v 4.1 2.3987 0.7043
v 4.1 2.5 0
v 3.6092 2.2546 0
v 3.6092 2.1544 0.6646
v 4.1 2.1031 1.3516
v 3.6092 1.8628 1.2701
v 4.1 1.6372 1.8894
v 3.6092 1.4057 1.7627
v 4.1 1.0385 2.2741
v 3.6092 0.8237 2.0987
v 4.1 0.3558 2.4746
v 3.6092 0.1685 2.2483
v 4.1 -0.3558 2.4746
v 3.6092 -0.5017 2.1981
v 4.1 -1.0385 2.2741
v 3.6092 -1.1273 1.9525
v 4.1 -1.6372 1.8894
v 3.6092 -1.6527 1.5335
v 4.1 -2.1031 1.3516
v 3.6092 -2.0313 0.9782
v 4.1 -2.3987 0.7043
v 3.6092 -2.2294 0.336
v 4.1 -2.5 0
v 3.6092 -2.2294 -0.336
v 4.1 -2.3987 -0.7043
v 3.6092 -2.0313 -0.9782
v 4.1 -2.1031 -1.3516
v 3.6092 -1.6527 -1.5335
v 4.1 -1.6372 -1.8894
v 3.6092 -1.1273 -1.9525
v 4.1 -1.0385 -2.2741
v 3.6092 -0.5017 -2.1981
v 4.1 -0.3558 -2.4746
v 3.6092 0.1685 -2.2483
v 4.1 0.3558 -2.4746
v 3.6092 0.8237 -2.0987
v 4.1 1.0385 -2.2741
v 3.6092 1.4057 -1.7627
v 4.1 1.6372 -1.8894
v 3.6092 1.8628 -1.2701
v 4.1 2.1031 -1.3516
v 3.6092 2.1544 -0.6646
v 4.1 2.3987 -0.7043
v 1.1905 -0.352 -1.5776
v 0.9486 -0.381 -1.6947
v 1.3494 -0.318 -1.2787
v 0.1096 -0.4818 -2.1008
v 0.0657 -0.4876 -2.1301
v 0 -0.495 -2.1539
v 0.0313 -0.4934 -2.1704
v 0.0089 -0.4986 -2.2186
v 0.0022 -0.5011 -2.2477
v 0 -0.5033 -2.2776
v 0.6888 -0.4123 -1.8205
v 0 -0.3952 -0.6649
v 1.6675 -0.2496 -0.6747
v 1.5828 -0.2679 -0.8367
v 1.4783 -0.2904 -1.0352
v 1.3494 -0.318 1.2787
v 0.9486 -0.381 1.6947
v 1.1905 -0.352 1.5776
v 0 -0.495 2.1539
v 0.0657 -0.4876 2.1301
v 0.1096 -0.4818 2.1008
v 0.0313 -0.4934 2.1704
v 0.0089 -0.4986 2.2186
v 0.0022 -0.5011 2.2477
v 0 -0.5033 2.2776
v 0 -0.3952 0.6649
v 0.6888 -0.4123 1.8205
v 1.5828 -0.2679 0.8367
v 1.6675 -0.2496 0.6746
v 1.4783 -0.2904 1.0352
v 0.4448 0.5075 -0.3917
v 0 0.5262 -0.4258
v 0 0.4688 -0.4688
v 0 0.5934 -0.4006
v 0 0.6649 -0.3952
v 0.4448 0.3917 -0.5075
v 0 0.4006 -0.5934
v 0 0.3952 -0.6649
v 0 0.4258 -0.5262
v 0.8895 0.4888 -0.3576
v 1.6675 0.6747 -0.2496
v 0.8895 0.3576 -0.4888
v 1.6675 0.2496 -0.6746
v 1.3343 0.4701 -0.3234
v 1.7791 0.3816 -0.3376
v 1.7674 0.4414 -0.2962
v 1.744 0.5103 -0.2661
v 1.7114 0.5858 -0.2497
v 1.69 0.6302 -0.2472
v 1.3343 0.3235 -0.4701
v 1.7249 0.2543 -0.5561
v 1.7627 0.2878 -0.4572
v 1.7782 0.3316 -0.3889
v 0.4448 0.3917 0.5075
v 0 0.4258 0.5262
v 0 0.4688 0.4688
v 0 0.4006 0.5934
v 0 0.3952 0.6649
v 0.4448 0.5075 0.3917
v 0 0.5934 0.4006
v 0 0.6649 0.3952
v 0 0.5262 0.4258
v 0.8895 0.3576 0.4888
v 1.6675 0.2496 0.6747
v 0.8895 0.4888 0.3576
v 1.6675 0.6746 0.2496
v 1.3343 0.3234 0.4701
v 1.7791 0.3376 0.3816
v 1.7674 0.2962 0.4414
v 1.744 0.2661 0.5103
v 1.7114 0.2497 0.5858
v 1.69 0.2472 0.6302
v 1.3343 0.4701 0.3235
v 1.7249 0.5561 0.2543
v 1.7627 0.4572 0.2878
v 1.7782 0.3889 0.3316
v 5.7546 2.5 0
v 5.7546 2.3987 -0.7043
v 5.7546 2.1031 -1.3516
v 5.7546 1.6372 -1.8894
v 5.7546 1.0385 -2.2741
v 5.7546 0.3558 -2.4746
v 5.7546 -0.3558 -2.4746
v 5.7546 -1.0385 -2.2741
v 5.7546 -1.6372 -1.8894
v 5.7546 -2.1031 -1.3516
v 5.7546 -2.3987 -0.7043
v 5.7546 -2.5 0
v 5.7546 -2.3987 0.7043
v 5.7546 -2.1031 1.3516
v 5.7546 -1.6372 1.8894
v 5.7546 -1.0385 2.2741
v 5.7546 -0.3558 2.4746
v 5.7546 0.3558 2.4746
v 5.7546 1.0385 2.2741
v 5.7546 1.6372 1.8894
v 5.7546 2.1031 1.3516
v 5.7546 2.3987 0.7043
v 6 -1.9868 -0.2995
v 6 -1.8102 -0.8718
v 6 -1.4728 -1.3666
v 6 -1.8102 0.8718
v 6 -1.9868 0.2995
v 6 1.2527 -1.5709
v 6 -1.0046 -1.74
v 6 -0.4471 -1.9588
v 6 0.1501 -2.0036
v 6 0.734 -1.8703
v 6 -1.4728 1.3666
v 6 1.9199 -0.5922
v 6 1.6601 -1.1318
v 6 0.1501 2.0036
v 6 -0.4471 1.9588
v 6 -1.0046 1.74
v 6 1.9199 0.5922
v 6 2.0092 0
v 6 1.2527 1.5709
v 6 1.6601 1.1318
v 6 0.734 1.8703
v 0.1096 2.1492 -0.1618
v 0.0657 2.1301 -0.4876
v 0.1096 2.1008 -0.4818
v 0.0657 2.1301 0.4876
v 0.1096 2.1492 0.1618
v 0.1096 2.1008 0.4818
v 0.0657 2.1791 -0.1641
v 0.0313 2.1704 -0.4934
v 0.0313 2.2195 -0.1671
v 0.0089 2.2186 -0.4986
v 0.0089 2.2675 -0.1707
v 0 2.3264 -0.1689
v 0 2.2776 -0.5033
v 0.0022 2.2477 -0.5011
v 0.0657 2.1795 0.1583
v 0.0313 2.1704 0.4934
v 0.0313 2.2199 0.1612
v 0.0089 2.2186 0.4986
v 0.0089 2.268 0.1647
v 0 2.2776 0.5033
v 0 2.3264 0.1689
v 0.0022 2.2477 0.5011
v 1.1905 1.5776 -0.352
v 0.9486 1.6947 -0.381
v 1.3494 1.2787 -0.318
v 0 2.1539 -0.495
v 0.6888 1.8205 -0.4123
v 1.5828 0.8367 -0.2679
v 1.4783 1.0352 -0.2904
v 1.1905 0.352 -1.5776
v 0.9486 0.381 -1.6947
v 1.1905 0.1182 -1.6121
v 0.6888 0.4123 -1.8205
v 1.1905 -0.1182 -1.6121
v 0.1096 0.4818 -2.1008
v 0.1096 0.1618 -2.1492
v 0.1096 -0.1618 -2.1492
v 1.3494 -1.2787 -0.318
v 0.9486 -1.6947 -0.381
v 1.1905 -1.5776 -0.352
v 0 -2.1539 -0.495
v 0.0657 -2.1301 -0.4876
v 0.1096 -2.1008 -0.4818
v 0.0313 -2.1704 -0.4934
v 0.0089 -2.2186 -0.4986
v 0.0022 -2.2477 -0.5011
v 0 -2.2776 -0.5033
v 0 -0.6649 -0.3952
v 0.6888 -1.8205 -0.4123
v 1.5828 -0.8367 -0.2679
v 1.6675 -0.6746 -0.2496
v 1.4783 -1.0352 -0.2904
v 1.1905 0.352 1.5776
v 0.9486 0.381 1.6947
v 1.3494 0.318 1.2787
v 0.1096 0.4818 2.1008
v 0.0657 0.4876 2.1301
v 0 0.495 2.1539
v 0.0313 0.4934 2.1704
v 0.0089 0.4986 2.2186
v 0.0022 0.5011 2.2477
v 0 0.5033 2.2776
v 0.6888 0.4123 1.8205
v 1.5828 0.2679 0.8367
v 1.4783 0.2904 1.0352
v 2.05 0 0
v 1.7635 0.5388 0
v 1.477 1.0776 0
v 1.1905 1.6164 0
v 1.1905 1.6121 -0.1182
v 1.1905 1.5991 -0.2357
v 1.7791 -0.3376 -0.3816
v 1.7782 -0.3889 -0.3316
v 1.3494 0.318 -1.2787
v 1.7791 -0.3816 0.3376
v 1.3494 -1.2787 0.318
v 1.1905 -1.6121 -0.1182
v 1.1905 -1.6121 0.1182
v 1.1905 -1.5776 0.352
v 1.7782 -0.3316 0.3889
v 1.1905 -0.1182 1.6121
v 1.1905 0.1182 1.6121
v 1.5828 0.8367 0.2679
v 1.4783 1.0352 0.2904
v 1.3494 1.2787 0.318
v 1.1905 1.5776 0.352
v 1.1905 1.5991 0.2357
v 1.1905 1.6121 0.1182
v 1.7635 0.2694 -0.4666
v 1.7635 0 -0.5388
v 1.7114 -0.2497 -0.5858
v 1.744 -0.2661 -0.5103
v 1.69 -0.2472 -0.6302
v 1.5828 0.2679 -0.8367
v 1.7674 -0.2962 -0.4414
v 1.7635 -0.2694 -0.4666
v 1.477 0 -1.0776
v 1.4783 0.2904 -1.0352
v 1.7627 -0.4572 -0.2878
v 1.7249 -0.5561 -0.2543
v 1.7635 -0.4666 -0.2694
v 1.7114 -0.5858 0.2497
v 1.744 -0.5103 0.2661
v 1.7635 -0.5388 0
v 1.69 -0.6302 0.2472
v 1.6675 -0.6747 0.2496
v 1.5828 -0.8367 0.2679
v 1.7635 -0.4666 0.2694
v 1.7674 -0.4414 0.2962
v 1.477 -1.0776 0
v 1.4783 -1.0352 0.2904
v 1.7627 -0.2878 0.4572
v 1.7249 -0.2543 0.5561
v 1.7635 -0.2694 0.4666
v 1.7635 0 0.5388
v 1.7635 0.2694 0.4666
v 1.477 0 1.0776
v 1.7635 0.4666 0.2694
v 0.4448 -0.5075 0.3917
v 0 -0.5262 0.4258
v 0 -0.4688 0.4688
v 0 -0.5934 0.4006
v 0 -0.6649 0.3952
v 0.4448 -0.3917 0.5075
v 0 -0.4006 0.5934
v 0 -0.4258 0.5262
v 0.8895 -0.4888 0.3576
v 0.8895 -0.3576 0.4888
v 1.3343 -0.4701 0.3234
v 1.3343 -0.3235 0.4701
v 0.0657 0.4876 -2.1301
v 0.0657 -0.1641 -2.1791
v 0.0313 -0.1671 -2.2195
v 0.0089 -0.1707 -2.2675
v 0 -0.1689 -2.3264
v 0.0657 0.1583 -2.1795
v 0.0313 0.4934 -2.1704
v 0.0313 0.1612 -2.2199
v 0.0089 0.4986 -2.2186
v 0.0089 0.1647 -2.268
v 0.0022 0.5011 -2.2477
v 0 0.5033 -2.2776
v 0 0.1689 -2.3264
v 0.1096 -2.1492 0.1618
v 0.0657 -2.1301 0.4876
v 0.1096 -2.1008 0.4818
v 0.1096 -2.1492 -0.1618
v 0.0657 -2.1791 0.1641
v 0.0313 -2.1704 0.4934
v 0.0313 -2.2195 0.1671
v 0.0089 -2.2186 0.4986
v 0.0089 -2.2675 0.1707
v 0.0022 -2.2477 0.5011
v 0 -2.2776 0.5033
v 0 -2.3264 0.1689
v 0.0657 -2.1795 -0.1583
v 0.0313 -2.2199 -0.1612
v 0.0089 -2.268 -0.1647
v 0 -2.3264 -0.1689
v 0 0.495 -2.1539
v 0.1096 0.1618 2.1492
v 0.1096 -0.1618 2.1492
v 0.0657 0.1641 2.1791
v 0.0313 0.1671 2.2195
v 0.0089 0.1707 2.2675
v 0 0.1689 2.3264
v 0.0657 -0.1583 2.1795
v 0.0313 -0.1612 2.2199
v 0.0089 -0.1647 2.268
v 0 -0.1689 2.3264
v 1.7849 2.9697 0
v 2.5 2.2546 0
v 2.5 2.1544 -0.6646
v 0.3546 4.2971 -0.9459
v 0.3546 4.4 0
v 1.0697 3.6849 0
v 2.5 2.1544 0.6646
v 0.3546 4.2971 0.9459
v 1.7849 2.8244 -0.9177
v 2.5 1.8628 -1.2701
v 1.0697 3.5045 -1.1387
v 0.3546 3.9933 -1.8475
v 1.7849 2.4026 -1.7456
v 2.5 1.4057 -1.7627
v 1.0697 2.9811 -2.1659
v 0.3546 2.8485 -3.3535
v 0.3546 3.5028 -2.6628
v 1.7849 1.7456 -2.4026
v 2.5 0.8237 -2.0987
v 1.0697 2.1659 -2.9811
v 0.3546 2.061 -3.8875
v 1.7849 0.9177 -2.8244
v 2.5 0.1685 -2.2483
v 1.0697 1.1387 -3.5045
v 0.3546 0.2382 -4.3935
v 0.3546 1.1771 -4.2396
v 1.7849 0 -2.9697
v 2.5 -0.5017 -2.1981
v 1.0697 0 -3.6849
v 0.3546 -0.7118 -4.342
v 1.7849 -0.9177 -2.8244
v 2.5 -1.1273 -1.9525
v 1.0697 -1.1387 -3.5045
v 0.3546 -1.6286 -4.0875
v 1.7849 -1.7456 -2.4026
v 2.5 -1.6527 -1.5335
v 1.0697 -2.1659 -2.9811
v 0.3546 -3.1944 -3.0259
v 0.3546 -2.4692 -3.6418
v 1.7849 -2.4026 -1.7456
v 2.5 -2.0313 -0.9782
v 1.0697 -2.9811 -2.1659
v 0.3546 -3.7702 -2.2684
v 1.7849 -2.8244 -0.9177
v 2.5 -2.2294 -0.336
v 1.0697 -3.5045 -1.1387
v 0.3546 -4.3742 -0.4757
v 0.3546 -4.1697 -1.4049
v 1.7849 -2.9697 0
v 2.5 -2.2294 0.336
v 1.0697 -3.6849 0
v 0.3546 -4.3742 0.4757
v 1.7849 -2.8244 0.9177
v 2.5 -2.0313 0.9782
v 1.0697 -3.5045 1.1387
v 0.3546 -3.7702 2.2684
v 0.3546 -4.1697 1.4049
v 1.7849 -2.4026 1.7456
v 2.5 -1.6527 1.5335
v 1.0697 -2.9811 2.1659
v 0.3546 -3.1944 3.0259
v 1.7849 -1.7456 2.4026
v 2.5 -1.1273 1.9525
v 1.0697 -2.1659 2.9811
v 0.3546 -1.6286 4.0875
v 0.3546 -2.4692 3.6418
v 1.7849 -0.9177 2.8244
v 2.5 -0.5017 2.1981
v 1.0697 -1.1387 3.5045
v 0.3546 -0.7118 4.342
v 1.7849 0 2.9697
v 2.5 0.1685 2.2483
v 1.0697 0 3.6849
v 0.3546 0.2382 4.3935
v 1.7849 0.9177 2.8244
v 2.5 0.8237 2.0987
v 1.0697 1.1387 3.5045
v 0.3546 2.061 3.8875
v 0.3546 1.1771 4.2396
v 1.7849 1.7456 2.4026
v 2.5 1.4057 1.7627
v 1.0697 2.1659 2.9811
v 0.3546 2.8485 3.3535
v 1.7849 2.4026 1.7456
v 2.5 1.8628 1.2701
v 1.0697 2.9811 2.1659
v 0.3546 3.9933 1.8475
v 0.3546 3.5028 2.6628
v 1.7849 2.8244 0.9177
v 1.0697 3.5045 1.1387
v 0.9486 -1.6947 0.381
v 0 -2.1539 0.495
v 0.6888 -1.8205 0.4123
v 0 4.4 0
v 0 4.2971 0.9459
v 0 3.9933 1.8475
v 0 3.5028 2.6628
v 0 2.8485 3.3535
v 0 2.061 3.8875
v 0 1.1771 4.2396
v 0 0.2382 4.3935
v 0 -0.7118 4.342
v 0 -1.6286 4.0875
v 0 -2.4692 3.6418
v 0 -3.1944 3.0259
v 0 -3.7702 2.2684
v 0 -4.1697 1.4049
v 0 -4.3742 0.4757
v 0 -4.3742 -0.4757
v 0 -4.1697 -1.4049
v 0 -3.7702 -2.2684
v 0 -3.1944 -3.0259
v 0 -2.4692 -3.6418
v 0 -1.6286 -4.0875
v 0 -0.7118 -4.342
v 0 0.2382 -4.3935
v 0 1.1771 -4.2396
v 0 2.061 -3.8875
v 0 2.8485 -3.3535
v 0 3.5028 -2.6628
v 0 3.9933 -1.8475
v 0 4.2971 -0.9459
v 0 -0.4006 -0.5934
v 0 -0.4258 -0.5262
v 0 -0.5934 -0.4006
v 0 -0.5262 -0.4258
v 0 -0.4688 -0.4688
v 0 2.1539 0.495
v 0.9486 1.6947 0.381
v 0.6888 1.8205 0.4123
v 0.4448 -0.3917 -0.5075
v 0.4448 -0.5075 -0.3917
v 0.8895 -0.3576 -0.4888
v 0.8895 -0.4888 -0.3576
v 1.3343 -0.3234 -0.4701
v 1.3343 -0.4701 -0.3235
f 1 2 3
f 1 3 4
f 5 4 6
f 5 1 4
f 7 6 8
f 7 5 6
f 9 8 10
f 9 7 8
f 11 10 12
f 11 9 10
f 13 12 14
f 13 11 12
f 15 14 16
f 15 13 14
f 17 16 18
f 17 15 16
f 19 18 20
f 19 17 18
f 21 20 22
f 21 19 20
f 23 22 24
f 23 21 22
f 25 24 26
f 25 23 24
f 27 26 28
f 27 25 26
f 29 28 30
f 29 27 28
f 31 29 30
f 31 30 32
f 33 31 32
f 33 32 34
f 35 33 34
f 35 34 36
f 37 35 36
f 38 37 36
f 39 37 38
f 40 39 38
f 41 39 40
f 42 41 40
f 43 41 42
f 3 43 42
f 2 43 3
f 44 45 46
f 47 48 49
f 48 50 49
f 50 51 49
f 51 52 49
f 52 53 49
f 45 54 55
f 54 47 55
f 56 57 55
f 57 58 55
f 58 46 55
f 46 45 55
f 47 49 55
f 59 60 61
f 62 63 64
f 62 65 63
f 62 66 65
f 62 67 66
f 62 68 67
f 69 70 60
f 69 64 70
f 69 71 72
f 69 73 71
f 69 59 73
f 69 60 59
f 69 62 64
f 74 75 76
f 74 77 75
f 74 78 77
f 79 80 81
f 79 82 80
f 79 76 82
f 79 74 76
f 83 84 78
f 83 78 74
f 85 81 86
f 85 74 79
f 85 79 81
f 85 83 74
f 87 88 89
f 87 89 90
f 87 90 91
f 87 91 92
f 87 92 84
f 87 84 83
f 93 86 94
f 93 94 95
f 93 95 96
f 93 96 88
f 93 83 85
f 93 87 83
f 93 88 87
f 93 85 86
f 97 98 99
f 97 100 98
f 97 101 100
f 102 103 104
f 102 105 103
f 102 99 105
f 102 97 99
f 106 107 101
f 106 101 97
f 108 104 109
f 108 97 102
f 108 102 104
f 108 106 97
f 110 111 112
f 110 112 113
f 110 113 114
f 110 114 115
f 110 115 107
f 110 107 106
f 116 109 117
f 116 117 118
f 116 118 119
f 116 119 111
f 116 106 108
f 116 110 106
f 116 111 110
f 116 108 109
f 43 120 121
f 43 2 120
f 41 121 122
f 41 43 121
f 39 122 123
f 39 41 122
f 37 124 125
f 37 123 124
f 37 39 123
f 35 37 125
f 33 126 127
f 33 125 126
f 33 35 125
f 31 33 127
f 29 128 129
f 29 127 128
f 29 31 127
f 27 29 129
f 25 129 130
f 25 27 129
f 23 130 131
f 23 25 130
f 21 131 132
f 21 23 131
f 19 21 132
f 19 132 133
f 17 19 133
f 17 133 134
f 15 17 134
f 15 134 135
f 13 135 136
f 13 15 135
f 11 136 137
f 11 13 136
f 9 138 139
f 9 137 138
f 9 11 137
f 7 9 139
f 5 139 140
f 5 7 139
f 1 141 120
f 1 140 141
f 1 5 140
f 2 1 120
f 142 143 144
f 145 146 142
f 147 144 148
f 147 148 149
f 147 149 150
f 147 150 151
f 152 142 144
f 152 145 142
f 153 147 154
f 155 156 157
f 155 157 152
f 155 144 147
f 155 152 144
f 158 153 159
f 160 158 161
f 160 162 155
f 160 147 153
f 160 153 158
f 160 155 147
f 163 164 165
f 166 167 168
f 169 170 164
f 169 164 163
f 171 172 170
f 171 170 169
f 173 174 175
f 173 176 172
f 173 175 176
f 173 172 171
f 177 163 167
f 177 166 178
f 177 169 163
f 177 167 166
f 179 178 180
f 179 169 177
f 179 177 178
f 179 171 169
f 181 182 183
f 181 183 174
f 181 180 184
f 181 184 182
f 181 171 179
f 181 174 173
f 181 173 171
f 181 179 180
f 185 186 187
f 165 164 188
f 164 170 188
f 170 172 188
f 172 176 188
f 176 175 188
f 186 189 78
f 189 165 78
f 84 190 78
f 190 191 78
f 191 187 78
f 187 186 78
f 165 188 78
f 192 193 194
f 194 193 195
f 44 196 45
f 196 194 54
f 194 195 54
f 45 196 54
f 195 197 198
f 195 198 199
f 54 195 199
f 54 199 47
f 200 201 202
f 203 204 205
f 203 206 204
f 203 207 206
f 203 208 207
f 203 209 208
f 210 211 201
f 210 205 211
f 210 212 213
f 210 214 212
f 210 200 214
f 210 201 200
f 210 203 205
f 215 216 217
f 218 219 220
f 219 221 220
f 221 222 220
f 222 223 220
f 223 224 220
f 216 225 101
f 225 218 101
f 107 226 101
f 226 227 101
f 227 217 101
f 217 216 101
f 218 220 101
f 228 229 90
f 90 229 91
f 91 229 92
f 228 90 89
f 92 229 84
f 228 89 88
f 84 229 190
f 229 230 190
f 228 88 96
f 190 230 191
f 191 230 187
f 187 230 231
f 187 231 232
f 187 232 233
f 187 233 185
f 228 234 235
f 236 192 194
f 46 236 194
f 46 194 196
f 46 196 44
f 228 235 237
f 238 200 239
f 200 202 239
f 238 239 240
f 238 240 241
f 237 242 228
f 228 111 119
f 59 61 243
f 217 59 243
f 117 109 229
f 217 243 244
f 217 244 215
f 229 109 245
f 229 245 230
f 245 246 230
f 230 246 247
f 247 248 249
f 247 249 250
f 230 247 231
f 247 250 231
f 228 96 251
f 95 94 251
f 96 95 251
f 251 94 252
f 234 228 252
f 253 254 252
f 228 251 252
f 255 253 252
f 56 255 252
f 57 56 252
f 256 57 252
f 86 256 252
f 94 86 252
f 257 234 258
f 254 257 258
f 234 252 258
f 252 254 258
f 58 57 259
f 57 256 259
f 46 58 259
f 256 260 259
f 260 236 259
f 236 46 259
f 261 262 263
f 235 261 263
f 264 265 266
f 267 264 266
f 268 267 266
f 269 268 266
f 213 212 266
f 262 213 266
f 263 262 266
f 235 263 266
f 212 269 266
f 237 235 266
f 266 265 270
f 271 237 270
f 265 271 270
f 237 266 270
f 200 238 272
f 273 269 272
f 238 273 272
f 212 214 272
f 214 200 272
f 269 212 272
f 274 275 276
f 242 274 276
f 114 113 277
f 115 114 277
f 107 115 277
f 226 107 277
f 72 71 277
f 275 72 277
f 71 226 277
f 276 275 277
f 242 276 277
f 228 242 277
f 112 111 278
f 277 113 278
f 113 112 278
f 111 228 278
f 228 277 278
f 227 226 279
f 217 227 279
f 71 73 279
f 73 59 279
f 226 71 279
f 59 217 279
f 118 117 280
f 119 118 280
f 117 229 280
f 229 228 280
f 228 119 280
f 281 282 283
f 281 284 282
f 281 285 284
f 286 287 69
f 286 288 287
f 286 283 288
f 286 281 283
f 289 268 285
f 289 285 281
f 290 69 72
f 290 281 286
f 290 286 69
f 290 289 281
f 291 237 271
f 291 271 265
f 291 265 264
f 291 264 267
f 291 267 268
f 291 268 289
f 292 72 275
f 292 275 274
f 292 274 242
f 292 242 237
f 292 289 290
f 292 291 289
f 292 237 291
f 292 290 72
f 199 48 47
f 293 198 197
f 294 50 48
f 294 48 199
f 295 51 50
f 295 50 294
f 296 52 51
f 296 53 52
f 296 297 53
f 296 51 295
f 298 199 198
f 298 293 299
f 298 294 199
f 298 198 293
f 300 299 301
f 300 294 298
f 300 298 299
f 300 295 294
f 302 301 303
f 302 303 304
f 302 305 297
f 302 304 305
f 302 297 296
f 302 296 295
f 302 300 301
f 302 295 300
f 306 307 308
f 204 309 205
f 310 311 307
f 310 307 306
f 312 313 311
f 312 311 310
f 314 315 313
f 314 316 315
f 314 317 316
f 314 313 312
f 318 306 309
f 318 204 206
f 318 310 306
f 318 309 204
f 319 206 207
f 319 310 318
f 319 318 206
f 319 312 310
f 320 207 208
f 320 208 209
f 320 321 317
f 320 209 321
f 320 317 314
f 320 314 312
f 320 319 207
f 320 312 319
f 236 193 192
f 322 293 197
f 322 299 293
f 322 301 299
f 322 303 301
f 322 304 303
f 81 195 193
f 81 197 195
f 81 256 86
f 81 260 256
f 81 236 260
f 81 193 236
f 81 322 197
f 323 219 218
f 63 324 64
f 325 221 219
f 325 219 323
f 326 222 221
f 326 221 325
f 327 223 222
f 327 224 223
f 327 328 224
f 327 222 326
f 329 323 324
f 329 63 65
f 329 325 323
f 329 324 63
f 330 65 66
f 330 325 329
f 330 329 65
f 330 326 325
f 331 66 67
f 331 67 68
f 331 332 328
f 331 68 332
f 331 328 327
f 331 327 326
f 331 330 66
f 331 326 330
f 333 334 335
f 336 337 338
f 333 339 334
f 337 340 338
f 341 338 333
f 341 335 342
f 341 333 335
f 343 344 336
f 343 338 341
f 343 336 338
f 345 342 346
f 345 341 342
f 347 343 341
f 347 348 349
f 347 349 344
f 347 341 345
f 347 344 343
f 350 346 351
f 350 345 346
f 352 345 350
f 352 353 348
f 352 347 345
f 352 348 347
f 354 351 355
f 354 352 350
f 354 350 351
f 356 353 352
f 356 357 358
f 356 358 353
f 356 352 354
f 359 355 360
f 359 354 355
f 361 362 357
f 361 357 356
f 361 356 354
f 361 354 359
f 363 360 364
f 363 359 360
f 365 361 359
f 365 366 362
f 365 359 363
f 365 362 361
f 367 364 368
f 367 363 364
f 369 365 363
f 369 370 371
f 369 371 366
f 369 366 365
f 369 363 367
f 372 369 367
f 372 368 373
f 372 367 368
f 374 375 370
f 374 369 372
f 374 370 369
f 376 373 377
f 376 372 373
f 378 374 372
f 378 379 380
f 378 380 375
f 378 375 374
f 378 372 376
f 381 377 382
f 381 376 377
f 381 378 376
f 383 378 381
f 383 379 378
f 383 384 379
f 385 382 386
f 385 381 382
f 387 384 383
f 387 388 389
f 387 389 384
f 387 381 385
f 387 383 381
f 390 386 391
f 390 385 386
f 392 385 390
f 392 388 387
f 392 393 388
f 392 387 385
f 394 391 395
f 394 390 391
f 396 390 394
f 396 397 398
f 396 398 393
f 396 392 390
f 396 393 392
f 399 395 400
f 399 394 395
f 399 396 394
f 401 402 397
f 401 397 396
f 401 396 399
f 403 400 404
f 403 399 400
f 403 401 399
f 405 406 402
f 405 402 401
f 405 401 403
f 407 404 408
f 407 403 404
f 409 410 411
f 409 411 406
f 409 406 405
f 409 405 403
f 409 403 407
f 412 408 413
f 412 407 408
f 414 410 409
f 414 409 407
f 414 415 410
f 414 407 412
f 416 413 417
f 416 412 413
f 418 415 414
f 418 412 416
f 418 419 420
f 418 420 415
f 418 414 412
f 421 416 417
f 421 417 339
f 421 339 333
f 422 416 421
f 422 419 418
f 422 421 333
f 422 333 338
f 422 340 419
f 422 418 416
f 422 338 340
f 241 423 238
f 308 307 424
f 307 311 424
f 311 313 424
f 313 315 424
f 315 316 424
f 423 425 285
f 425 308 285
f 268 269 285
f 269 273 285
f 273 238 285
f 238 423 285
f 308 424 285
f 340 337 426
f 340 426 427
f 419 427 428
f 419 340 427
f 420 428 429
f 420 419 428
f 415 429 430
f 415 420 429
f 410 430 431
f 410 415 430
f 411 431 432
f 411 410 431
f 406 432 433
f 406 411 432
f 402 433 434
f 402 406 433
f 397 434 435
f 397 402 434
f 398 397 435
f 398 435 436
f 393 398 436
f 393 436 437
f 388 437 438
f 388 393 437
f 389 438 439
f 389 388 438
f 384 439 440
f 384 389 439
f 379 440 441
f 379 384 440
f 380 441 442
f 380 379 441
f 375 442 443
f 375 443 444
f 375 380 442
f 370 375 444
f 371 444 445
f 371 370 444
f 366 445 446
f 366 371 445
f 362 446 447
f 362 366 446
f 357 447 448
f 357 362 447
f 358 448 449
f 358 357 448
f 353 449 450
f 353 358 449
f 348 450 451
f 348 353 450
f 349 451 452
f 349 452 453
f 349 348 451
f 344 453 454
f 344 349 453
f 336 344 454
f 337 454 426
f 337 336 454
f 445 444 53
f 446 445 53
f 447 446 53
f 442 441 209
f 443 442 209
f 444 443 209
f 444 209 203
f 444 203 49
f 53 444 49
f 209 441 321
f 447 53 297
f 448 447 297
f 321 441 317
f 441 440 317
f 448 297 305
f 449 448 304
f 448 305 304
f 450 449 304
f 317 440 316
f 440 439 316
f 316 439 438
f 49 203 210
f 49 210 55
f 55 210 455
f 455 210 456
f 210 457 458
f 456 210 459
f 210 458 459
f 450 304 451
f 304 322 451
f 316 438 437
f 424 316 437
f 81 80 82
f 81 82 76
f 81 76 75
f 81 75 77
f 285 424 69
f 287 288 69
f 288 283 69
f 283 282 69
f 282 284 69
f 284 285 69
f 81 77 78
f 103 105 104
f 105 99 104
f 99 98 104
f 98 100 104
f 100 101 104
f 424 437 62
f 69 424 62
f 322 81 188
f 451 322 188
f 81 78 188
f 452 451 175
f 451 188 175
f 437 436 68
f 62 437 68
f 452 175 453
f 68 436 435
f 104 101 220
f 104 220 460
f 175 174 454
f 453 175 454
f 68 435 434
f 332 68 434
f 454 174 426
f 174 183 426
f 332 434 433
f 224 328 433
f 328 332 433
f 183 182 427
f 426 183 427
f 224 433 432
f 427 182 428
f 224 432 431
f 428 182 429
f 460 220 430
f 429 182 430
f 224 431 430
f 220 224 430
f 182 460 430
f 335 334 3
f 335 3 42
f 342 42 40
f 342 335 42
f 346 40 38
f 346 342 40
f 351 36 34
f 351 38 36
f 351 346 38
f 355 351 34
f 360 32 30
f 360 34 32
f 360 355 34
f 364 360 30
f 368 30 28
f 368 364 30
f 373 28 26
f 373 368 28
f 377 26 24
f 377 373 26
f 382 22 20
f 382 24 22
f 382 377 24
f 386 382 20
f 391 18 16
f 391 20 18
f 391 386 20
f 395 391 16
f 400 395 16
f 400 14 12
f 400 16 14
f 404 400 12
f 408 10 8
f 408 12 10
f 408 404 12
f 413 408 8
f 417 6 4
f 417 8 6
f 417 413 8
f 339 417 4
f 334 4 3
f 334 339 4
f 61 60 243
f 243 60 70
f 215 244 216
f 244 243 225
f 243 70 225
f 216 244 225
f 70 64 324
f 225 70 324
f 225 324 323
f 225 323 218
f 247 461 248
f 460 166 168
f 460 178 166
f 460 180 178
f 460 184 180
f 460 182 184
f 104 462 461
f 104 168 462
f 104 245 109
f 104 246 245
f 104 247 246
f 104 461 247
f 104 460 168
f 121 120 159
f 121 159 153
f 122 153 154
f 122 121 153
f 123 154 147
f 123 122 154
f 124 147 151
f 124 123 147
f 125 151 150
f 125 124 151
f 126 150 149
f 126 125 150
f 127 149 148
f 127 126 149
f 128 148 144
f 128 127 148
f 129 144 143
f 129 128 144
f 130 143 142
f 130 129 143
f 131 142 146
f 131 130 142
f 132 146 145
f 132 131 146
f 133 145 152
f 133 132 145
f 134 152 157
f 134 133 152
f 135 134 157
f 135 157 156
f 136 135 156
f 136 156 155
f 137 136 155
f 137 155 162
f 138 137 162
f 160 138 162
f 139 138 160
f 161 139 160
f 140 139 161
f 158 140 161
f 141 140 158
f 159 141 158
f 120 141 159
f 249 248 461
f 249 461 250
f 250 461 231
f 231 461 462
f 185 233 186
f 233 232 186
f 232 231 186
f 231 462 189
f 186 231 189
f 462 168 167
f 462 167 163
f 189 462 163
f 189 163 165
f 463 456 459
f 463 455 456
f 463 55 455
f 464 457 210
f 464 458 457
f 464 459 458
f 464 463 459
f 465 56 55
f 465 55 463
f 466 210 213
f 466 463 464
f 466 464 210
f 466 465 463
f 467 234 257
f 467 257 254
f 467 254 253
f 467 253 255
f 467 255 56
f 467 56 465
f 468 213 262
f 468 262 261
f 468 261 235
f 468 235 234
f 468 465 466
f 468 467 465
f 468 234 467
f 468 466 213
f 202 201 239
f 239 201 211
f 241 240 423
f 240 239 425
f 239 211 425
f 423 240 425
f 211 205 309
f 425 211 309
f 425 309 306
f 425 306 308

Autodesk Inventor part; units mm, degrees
ref_plane "YZ Plane" through (0, 0, 0) normal (1, 0, 0) x (0, 1, 0)
ref_plane "XZ Plane" through (0, 0, 0) normal (0, 1, 0) x (-1, 0, 0)
sketch "Sketch1" plane through (0, 0, 0) normal (0, 0, 1) x (1, 0, 0)
  line L0 (2.05, 0) -> (6, 0)
  line L1 (6, 0) -> (6, 2.5)
  line L2 (6, 2.5) -> (4.1, 2.5)
  line L3 (4.1, 2.5) -> (3.6092, 2.2546)
  line L4 (3.6092, 2.2546) -> (2.5, 2.2546)
  line L5 (0, 4.4) -> (0, 2.21)
  line L6 (0, 2.21) -> (1.1905, 1.6164)
  line L7 (1.1905, 1.6164) -> (2.05, 0)
  line L8 (-1.2, 0) -> (7.2, 0) projected
  line L9 (0, -0.88) -> (0, 5.28) projected
  line L10 (0, 4.4) -> (0.3546, 4.4)
  line L11 (0.3546, 4.4) -> (2.5, 2.2546)
  line L12 (4.1, 2.5) -> (2.2546, 2.5) construction
  dimension "d1" = 1.9
  dimension "d2" = 5
  dimension "d3" = 4.5092
  dimension "d4" = 4.42
  dimension "d5" = 26.5
  dimension "d6" = 62
  dimension "d7" = 2.05
  dimension "d8" = 0.4908
  dimension "d12" = 8.8
  dimension "d13" = 45
  dimension "d15" = 6
  dimension "d24" = 2.5
revolve "Body" add sketch "Sketch1" angle 360 about axis through (2.05, 0, 0) along (1, 0, 0) contours L7 L6 L5 L10 L11 L4 L3 L2 L1 L0
sketch "Sketch2" plane through (0, 0, 0) normal (-1, 0, 0) x (0, 0, 1)
  line L0 (0, 2.21) -> (0, 0) construction
  line L1 (0, 0) -> (2.21, 0) construction
  arc A0 (0.663, 0) -> (0, 0.663) centre (0, 0) ccw construction
  arc A1 (0.7735, 0) -> (0, 0.7735) centre (0, 0) ccw construction
  arc A2 (2.1539, 0.495) -> (0.495, 2.1539) centre (0, 0) ccw
  line L2 (0, 0) -> (1.5627, 1.5627) construction
  line L3 (0.495, 2.1539) -> (0.3952, 0.6649)
  line L4 (2.1539, 0.495) -> (0.6649, 0.3952)
  arc A3 (0.495, 2.1539) -> (0, 2.21) centre (0, 0) ccw
  arc A4 (2.21, 0) -> (2.1539, 0.495) centre (0, 0) ccw
  line L5 (0, -6.16) -> (0, 6.16) projected
  line L6 (-6.16, 0) -> (6.16, 0) projected
  arc A5 (0.495, -2.1539) -> (2.1539, -0.495) centre (0, 0) ccw
  line L7 (0.495, -2.1539) -> (0.3952, -0.6649)
  line L8 (2.1539, -0.495) -> (0.6649, -0.3952)
  arc A6 (0, -2.21) -> (0.495, -2.1539) centre (0, 0) ccw
  arc A7 (2.1539, -0.495) -> (2.21, 0) centre (0, 0) ccw
  arc A8 (-0.495, 2.1539) -> (-2.1539, 0.495) centre (0, 0) ccw
  line L9 (-0.495, 2.1539) -> (-0.3952, 0.6649)
  line L10 (-2.1539, 0.495) -> (-0.6649, 0.3952)
  arc A9 (0, 2.21) -> (-0.495, 2.1539) centre (0, 0) ccw
  arc A10 (-2.1539, 0.495) -> (-2.21, 0) centre (0, 0) ccw
  arc A11 (-0.495, -2.1539) -> (0, -2.21) centre (0, 0) ccw
  arc A12 (-2.1539, -0.495) -> (-0.495, -2.1539) centre (0, 0) ccw
  arc A13 (-2.21, 0) -> (-2.1539, -0.495) centre (0, 0) ccw
  line L11 (-2.1539, -0.495) -> (-0.6649, -0.3952)
  line L12 (-0.495, -2.1539) -> (-0.3952, -0.6649)
  arc A14 (0.3952, 0.6649) -> (0.6649, 0.3952) centre (0.648, 0.648) ccw
  arc A15 (0.6649, -0.3952) -> (0.3952, -0.6649) centre (0.648, -0.648) ccw
  arc A16 (-0.6649, 0.3952) -> (-0.3952, 0.6649) centre (-0.648, 0.648) ccw
  arc A17 (-0.3952, -0.6649) -> (-0.6649, -0.3952) centre (-0.648, -0.648) ccw
  point P0 (1.5627, -1.5627)
  point P1 (-1.5627, 1.5627)
  point P2 (-1.5627, -1.5627)
  dimension "d17" = 1.326
  dimension "d18" = 1.547
  dimension "d19" = 4.42
  dimension "d20" = 45
  dimension "d21" = 0.495
extrude "Slot" add sketch "Sketch2" against normal up to next draft 5 contours L4 A14 L3 A2 | A5 L7 A15 L8 | L9 A16 L10 A8 | A12 L11 A17 L12
fillet "Fillet1" radius 0.198 4 edges at (0, 2.21, 0) (0, 0, -2.21) (0, -2.21, 0) (0, 0, 2.21)
thread "Thread" size "M5x0.8" class "6g" standard "ISO Metric profile" length 1.9
chamfer "Chamfer1" distance 0.4908 distance2 0.2454 1 edges at (6, -2.5, 0) measured on face at (6, 0.6238, 0.5526)
ref_plane "Work Plane2" through (3.35, 0, 0) normal (0, 0, -1) x (1, 0, 0)
equation "\"d1\" = GEL"
equation "\"d2\" = GD"
equation "\"d3\" = BDM"
equation "\"d4\" = SDM"
equation "\"d7\" = INTI"
equation "\"d8\" = GAL"
equation "\"d12\" = KOD"
equation "\"d13\" = 0.5 * SEWI"
equation "\"d15\" = NLG"
equation "\"d24\" = KOH"
equation "\"d17\" = 0.3 * SDM"
equation "\"d18\" = 0.35 * SDM"
equation "\"d19\" = SDM"
equation "\"d21\" = 0.5 * SBR"
equation "\"d23\" = 0.2 * SBR"
equation "\"d10\" = GEL"
equation "\"d25\" = -0.5 * SPD + 0.5 * GD"
equation "\"d26\" = 0.5 * GAL"
equation "\"NLG\" = 6"
equation "\"GEL\" = 1.9"
equation "\"GAL\" = 0.61345 * PTC"
equation "\"SPD\" = NND - 1.2269 * PTC"
equation "\"KOD\" = 8.8"
equation "\"KOH\" = 2.5"
equation "\"SBR\" = 0.99"
equation "\"INTI\" = 2.05"
equation "\"SDM\" = 4.42"
equation "\"GD\" = NND"
equation "\"BDM\" = NND - GAL"
equation "\"SEWI\" = 90deg"
equation "\"d9\" = SDM"
equation "\"GUL\" = 0.61345 * PTC"
equation "\"TOA\" = 30deg"
equation "\"EPV\" = 5"
equation "\"THREADDIA\" = 5"
equation "\"RR\" = 0.5"
equation "\"PTC\" = 0.8"
equation "\"NND\" = 5"
equation "\"GD1\" = THREADDIA - 1.2269 * PTC"
properties part number "AS 1427 - M5 x 6" material "Steel, Mild"
